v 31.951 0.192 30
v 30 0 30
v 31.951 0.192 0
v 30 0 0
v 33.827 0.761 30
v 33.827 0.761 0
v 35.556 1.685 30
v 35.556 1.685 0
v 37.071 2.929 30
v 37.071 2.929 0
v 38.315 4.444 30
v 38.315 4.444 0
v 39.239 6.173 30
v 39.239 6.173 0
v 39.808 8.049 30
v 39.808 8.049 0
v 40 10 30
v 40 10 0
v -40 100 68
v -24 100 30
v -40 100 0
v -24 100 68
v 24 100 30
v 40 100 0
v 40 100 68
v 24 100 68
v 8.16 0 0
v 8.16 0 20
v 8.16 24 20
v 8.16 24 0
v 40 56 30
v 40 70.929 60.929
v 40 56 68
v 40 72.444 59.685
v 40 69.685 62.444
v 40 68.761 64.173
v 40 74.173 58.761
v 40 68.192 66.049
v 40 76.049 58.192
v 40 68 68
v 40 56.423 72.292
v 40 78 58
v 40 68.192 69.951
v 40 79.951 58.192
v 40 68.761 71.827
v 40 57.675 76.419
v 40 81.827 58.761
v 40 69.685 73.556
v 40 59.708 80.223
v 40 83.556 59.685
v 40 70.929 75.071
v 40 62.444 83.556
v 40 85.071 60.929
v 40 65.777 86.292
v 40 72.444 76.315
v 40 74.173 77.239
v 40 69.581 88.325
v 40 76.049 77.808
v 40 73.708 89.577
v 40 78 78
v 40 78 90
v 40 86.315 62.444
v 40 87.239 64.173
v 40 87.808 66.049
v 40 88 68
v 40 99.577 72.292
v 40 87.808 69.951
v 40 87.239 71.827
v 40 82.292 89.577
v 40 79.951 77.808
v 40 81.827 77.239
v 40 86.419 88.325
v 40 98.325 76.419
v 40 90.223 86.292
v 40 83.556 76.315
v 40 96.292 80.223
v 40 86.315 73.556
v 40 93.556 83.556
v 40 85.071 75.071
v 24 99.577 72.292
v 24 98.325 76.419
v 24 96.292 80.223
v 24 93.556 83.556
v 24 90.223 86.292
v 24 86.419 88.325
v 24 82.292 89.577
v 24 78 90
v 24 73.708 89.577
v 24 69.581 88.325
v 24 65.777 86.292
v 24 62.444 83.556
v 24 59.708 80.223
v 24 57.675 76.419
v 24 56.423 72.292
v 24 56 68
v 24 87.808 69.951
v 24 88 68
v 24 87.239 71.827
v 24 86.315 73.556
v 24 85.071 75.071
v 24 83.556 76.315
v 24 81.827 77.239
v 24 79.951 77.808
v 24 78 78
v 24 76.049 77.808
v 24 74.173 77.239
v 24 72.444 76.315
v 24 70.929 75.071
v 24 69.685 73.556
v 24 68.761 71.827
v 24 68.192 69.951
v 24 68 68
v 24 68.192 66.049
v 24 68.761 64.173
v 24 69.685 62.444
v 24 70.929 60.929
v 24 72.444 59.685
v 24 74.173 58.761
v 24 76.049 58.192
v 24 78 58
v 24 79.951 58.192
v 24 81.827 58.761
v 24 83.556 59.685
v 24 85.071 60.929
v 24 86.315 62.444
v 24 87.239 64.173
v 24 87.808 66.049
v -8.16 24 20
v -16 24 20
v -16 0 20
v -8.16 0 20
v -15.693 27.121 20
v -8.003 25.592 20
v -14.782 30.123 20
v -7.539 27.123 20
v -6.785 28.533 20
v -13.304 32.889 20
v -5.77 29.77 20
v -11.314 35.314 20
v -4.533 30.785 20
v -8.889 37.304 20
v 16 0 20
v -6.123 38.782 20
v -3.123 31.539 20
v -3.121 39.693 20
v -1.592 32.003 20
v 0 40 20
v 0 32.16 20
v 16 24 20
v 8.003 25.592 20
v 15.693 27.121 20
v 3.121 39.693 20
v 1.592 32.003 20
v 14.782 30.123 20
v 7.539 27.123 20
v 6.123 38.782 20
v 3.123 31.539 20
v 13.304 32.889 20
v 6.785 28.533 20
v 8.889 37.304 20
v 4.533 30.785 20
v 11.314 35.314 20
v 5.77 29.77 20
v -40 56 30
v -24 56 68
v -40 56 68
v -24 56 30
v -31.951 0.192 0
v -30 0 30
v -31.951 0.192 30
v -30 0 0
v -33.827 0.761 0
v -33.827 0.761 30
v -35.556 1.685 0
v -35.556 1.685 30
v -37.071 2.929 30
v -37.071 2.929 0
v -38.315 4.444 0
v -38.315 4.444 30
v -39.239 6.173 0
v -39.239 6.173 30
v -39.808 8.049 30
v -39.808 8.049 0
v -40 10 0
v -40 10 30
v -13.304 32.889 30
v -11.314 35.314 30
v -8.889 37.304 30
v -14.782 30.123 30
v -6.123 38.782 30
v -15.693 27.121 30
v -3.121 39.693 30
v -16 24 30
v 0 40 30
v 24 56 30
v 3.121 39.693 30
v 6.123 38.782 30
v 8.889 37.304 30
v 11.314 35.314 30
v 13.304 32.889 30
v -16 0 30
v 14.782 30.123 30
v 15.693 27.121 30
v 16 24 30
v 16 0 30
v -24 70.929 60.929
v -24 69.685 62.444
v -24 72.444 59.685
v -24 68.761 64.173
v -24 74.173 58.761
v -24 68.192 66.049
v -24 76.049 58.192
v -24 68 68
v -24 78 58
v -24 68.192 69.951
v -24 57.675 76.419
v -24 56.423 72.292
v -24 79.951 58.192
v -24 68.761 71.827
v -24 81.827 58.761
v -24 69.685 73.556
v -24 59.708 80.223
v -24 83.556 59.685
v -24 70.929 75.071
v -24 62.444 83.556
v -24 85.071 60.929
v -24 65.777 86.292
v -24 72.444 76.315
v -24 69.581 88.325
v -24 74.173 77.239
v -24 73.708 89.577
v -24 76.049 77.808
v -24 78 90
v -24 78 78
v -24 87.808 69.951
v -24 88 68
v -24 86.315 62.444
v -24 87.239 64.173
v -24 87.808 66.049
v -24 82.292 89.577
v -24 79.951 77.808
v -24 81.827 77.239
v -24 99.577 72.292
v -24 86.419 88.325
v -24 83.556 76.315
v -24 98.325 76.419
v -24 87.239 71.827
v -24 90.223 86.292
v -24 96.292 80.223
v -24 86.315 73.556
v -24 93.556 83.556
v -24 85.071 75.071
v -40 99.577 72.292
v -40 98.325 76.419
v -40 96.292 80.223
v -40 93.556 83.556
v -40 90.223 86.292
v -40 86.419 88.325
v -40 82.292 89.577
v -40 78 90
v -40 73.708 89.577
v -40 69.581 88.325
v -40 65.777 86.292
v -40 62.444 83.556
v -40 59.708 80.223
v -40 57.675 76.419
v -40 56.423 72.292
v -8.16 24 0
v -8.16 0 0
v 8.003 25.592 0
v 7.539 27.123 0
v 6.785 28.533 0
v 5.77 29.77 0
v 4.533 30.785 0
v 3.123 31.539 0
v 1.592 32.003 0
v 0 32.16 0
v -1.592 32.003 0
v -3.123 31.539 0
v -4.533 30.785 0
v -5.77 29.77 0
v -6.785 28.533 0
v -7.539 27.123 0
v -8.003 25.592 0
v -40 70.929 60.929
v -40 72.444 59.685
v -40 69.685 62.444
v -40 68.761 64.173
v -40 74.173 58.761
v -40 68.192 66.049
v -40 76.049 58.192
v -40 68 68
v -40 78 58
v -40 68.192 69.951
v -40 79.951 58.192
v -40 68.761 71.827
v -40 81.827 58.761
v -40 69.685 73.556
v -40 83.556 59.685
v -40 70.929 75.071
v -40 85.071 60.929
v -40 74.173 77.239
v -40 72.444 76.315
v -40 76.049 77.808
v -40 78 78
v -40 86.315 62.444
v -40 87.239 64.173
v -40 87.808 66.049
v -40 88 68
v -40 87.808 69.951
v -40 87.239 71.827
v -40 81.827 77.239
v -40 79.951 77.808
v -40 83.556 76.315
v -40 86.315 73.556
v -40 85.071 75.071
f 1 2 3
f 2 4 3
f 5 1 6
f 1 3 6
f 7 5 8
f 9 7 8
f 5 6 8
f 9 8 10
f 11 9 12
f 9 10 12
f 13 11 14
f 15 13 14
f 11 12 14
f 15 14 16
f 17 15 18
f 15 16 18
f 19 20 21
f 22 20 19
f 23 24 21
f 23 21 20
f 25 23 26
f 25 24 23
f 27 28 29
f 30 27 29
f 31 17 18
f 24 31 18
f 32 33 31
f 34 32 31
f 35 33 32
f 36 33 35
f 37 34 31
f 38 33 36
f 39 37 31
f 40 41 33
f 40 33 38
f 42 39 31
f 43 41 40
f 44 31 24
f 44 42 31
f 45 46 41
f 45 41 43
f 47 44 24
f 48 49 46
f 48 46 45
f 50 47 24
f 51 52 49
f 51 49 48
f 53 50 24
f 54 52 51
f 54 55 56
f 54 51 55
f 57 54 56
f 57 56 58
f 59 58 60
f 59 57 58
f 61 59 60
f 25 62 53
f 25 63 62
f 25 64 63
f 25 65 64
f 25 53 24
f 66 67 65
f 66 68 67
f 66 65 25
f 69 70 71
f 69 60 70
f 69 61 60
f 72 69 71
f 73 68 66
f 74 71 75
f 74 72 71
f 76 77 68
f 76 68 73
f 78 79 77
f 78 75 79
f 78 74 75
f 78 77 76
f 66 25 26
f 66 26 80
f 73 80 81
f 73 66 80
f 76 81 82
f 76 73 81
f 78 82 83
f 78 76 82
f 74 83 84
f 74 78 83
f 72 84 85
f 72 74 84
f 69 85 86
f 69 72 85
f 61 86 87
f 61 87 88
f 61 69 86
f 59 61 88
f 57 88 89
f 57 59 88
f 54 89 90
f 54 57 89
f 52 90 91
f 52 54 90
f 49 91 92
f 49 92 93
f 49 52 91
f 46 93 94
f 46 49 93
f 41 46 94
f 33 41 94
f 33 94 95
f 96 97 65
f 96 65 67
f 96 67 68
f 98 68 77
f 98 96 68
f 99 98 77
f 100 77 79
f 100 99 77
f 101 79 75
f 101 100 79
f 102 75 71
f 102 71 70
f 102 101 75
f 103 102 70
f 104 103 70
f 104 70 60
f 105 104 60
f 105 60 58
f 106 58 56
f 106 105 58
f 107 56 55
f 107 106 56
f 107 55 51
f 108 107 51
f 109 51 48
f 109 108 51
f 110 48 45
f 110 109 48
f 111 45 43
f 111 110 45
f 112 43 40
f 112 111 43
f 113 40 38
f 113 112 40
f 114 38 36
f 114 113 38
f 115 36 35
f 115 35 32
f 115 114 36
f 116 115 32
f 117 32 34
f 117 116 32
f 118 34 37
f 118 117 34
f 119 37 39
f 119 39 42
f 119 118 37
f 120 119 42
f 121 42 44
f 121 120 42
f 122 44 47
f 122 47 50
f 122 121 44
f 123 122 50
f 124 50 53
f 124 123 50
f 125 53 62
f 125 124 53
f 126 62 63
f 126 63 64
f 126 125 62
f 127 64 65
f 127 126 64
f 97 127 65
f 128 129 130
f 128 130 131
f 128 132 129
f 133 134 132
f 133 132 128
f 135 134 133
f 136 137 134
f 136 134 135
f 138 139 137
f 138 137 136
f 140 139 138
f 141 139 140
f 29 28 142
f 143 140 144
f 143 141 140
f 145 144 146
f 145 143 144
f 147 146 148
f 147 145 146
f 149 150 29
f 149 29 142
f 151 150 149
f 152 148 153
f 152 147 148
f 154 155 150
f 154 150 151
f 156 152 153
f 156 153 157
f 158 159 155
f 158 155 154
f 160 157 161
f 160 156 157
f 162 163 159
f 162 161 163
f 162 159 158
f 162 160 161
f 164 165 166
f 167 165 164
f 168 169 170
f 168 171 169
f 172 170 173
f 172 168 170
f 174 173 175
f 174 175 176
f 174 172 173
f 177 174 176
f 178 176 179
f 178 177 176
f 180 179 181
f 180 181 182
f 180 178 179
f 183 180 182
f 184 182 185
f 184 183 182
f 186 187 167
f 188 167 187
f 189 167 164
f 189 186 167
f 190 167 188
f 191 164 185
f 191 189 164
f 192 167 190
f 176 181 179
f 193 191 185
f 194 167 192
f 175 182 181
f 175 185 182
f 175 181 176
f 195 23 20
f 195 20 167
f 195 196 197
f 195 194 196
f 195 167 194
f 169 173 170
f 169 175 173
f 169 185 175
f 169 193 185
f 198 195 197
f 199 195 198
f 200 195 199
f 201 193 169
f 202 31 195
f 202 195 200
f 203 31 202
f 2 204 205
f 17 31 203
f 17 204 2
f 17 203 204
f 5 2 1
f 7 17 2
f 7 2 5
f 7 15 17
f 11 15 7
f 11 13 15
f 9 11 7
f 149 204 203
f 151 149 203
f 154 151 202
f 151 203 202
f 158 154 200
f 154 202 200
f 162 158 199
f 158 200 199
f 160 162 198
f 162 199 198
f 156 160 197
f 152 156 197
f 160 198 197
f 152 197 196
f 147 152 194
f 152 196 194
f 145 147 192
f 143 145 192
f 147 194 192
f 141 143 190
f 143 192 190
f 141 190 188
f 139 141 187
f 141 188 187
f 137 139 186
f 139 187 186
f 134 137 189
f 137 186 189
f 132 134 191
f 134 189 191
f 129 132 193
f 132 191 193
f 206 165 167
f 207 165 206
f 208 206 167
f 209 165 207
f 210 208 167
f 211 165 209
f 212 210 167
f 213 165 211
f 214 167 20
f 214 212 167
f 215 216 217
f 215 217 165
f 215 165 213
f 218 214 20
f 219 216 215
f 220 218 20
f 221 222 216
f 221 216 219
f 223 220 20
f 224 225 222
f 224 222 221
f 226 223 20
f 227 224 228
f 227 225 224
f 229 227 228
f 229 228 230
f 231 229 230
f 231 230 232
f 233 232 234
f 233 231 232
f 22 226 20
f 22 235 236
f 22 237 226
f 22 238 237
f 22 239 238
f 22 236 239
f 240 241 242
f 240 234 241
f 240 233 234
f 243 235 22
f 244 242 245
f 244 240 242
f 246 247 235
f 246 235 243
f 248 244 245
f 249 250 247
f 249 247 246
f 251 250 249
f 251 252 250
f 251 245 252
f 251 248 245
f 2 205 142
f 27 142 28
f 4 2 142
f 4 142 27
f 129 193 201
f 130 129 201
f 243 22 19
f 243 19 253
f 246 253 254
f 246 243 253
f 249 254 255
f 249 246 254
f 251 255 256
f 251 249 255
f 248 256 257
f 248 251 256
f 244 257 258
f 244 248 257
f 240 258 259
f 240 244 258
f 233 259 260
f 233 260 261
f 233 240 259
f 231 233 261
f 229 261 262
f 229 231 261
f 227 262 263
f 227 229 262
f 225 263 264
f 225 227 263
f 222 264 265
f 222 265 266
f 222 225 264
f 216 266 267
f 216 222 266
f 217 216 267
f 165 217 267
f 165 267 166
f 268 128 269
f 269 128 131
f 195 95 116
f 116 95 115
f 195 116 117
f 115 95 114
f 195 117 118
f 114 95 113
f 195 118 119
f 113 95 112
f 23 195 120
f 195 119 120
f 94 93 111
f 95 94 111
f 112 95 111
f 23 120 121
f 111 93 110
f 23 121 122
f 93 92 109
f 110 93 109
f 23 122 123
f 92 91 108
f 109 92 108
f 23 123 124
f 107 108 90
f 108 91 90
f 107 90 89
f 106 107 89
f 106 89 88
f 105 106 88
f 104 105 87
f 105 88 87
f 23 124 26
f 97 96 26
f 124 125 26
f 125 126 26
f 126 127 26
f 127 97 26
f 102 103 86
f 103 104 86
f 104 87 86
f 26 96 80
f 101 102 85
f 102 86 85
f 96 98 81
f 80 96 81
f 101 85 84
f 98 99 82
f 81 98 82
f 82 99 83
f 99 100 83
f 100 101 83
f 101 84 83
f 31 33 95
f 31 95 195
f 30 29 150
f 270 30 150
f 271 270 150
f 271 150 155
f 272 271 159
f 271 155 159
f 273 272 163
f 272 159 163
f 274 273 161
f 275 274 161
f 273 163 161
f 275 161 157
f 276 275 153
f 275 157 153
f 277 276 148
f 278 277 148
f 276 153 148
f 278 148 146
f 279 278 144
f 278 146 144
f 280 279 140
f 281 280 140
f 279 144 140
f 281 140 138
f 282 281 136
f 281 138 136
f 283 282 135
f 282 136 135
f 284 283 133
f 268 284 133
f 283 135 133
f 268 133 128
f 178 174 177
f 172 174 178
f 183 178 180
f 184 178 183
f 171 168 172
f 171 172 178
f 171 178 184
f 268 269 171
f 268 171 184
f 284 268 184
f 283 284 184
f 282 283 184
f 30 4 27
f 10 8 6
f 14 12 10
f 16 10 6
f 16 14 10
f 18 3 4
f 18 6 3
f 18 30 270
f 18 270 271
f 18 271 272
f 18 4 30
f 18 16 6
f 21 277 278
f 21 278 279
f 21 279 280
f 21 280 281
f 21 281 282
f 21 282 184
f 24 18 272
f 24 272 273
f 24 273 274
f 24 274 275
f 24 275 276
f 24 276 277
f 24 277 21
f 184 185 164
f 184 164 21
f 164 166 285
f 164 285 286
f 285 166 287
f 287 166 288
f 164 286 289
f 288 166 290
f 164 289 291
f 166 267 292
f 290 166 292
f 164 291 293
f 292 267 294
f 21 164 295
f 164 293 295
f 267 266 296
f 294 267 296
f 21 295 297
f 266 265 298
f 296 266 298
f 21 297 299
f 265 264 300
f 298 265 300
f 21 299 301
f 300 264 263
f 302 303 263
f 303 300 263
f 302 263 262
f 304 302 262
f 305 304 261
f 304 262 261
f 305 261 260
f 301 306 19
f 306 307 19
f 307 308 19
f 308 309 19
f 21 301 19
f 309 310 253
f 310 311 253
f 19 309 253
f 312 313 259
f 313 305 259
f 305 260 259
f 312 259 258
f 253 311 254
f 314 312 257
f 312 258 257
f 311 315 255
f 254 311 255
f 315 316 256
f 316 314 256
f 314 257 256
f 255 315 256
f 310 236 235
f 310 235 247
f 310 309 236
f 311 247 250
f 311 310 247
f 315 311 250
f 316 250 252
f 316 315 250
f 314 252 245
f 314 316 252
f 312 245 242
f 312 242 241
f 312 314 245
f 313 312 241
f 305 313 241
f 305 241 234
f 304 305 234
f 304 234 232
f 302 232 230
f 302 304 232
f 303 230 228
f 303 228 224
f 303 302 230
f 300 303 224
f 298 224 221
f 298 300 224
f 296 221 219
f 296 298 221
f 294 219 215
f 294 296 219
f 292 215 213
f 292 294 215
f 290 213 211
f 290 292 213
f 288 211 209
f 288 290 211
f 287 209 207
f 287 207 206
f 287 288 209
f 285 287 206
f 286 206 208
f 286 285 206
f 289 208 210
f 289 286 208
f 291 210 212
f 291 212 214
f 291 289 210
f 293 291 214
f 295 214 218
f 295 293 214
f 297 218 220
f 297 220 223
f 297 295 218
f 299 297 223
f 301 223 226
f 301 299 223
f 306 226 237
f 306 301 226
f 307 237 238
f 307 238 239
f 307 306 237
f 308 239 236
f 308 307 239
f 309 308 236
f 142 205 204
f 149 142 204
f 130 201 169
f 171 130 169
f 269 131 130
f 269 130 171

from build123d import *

# Parameters (mm, degrees)
F0_R     = 10
F1_DEPTH = 40
F2_DEPTH = 24
F3_W     = 7.84
F3_H     = 5
F3_W_2   = 16.32
F4_DEPTH = 10
F3_H_2   = 24
F5_DEPTH = 30
F6_R     = 10


with BuildPart() as f1:
    # F0 (on Right) → F1 (new body, symmetric)
    with BuildSketch(Plane.YZ):
        Polygon((0, 30), (0, 0), (100, 0), (100, 30), (56, 30), align=None)
        with BuildLine():
            Line((56, 68), (56, 30))
            Line((56, 30), (100, 30))
            Line((100, 30), (100, 68))
            ThreePointArc((100, 68), (78, 46), (56, 68))
        make_face()
        with BuildLine():
            ThreePointArc((100, 68), (78, 90), (56, 68))
            ThreePointArc((56, 68), (78, 46), (100, 68))
        make_face()
        with Locations((78, 68)):
            Circle(F0_R, mode=Mode.SUBTRACT)
    extrude(amount=F1_DEPTH, both=True)

    # F0 (on Right) → F2 (cut, symmetric)
    with BuildSketch(Plane.YZ):
        with BuildLine():
            Line((56, 68), (56, 30))
            Line((56, 30), (100, 30))
            Line((100, 30), (100, 68))
            ThreePointArc((100, 68), (78, 46), (56, 68))
        make_face()
        with BuildLine():
            ThreePointArc((100, 68), (78, 90), (56, 68))
            ThreePointArc((56, 68), (78, 46), (100, 68))
        make_face()
        with Locations((78, 68)):
            Circle(F0_R, mode=Mode.SUBTRACT)
    extrude(amount=F2_DEPTH, both=True, mode=Mode.SUBTRACT)

    # F3 (on face) → F4 (cut)
    with BuildSketch(Plane.XY.offset(30)):
        with Locations((-12.08, 2.5)):
            Rectangle(F3_W, F3_H)
        with BuildLine():
            Line((-16, 24), (-16, 5))
            Line((-16, 5), (-8.16, 5))
            Line((-8.16, 5), (-8.16, 24))
            ThreePointArc((-8.16, 24), (0, 32.16), (8.16, 24))
            Line((8.16, 24), (8.16, 5))
            Line((8.16, 5), (16, 5))
            Line((16, 5), (16, 24))
            ThreePointArc((16, 24), (0, 40), (-16, 24))
        make_face()
        with Locations((12.08, 2.5)):
            Rectangle(F3_W, F3_H)
        with Locations((0, 2.5)):
            Rectangle(F3_W_2, F3_H)
        with BuildLine():
            Line((-8.16, 24), (-8.16, 5))
            Line((-8.16, 5), (8.16, 5))
            Line((8.16, 5), (8.16, 24))
            ThreePointArc((8.16, 24), (0, 32.16), (-8.16, 24))
        make_face()
    extrude(amount=-F4_DEPTH, mode=Mode.SUBTRACT)

    # F3 (on face) → F5 (cut, through all)
    with BuildSketch(Plane.XY.offset(30)):
        with BuildLine():
            Line((-8.16, 24), (-8.16, 5))
            Line((-8.16, 5), (8.16, 5))
            Line((8.16, 5), (8.16, 24))
            ThreePointArc((8.16, 24), (0, 32.16), (-8.16, 24))
        make_face()
        with Locations((0, 2.5)):
            Rectangle(F3_W_2, F3_H)
        with Locations((0, -12)):
            Rectangle(F3_W_2, F3_H_2)
    extrude(amount=-F5_DEPTH, mode=Mode.SUBTRACT)

    # F6
    f6_edges = [f1.edges().sort_by_distance(p)[0] for p in [
        (-40, 0, 15),
        (40, 0, 15),
    ]]
    fillet(f6_edges, radius=F6_R)


solid = f1.part
